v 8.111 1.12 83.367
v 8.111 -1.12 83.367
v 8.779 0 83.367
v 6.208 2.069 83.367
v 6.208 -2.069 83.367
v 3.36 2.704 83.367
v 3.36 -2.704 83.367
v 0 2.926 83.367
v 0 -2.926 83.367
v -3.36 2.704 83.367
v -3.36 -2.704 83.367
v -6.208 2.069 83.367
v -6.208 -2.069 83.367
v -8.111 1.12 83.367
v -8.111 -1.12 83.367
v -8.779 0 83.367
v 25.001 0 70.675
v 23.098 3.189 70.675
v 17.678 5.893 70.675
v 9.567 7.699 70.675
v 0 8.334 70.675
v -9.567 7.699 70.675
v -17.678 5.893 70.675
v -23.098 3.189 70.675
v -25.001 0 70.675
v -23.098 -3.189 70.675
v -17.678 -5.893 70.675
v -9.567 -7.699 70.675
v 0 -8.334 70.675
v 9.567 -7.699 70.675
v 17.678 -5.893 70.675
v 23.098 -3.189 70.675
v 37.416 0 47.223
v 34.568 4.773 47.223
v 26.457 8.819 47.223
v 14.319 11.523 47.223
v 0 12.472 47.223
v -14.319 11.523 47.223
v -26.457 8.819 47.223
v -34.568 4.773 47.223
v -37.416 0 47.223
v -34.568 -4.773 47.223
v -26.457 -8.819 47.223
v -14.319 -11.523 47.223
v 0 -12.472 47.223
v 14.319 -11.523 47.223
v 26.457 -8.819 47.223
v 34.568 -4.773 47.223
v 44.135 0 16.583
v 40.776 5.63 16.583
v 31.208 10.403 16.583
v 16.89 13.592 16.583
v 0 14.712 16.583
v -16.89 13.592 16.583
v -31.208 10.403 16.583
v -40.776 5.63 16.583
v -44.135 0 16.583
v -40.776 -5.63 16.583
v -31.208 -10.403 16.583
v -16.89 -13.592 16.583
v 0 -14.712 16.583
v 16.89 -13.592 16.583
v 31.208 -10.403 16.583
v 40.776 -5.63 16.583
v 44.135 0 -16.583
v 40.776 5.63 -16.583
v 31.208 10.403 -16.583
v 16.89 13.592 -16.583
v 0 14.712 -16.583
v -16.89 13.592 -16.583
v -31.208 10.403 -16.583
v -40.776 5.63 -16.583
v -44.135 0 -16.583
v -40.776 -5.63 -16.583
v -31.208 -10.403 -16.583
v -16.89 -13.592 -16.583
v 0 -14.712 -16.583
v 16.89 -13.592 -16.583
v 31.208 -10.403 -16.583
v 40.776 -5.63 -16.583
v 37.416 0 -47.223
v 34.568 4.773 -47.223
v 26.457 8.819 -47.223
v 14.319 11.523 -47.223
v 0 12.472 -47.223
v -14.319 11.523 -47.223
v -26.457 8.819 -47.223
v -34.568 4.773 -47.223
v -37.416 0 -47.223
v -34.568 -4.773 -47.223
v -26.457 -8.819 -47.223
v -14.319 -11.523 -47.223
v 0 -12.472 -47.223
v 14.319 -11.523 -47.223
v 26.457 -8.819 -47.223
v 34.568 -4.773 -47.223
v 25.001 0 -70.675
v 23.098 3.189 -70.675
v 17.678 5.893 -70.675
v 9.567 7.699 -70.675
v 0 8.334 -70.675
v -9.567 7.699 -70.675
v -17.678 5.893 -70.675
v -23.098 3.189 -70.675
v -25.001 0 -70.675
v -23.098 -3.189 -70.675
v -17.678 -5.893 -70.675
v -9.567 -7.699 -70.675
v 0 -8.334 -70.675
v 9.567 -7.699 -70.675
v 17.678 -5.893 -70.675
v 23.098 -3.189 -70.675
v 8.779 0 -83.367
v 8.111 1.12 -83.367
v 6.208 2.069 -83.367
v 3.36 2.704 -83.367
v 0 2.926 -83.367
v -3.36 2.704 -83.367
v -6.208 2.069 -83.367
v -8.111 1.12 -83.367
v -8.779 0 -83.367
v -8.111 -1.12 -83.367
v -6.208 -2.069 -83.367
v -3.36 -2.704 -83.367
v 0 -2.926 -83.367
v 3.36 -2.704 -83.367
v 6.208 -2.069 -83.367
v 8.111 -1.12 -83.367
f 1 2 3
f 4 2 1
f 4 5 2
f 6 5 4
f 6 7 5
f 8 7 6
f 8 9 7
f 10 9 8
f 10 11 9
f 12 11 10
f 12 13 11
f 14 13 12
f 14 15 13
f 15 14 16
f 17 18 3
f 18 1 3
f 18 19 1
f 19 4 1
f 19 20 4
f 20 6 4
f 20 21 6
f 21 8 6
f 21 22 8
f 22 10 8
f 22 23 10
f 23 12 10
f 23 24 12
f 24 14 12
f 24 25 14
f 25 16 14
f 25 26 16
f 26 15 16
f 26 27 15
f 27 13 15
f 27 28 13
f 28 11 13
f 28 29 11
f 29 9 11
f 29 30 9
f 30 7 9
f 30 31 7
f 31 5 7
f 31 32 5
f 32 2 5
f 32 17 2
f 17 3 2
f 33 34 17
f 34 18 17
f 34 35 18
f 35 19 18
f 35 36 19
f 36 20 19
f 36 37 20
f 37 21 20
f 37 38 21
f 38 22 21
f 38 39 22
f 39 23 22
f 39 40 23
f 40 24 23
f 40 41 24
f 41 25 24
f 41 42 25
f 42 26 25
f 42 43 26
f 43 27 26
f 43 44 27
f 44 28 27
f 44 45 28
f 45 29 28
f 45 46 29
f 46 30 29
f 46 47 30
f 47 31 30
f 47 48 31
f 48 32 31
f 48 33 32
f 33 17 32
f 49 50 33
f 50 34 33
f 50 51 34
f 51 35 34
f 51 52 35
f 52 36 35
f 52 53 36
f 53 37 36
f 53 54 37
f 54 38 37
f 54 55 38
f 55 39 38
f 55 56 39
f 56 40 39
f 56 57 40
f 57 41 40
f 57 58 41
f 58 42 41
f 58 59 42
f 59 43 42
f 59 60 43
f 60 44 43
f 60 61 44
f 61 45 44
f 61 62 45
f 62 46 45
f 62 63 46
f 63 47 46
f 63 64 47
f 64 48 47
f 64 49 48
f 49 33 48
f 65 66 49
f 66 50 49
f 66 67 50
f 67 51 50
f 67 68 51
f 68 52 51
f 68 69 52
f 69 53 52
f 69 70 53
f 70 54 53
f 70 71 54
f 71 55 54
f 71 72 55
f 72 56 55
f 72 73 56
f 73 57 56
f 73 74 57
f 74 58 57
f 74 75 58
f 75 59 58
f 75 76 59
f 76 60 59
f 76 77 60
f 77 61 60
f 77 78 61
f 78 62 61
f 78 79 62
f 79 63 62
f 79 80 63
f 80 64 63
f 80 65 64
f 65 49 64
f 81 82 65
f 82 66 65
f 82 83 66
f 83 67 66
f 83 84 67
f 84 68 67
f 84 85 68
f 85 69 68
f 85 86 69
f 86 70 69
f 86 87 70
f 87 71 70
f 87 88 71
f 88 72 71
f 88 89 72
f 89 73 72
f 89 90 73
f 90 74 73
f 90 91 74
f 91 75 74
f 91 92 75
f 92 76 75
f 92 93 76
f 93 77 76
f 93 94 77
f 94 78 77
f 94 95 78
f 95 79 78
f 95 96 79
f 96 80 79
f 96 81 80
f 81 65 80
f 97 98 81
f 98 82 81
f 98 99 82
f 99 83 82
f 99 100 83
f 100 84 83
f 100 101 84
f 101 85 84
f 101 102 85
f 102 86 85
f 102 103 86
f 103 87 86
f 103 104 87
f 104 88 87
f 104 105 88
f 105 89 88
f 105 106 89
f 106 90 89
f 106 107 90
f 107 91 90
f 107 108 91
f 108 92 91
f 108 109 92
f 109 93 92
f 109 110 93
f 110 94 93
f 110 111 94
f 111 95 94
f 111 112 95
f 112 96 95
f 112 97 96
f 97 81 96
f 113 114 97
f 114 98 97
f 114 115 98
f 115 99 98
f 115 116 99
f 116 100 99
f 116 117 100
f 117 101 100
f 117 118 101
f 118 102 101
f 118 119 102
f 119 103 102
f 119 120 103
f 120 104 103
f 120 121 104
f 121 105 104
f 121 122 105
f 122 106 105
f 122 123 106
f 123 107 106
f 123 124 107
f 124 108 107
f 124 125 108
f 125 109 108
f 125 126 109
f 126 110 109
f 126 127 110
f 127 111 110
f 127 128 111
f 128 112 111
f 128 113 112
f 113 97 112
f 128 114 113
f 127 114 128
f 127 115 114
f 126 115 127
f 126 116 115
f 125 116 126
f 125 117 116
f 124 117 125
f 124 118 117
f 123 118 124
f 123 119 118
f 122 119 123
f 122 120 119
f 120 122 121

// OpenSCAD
// Generated by SolidPython 1.0.1 on 2020-07-29 00:46:48


scale(v = [9, 3, 17]) {
	sphere(r = 5);
}
/***********************************************
*********      SolidPython code:      **********
************************************************
 
# import packages: SolidPython
from solid import *
from solid.utils import *
from itertools import chain, combinations, permutations


class Resize:

    def __init__(self, scad_file):
        self.scad_file = scad_file
        #self.scad_file = import_scad(scad_file)
        # cone/cylinder param:
        self.r1 = 0
        self.r2 = 0
        self.h = 0
        # rectangular prism param:
        self.w = 0
        self.l = 0
        # ellipse param:
        self.r = 0

    # import OpenScad code (file name corresponds to shape)


    # classify shape + parameters
    def assign(self, param1, param2, param3):
        if self.scad_file == 'cone.scad':
            self.r1 = param1
            self.r2 = param2
            self.h = param3
        elif self.scad_file == 'cylinder.scad':
            self.r1 = param1
            self.r2 = param2
            self.h = param3
        elif self.scad_file == 'rectangularPrism.scad':
            self.h = param1
            self.l = param2
            self.w = param3
        else:
            self.r = param1
            self.h = param2

    # resize parameters
    def iterate(self):
        x = range(3, 20, 2)
        i = 1
        if self.scad_file == 'cone.scad':
            tempList = list(permutations(x, 2))
            for temp in tempList:
                param1 = temp[0]
                param2 = temp[1]
                filepath = 'produced_scad_files/' + 'cone' + str(param1) + '_' + str(param2) + '_' + '.scad'
                scad_render_to_file(cylinder(h=param1, r1=param2, r2=0), filepath)

        elif self.scad_file == 'cylinder.scad':
            tempList = list(permutations(x, 3))
            for temp in tempList:
                param1 = temp[0]
                param2 = temp[1]
                filepath = 'produced_scad_files/' + 'cylinder' + str(param1) + '_' + str(param2) + '_' + '.scad'
                scad_render_to_file(cylinder(h=param1, r1=param2, r2=param2), filepath)

        elif self.scad_file == 'rectangularPrism.scad':
            tempList = list(permutations(x, 3))
            for temp in tempList:
                param1 = temp[0]
                param2 = temp[1]
                param3 = temp[2]
                filepath = 'produced_scad_files/' + 'rectangularPrism' + str(param1) + '_' + str(param2) + '_' + str(
                    param3) + '.scad'
                scad_render_to_file(cube(size=(param1, param2, param3)), filepath)

        elif self.scad_file == 'ellipse.scad':
            tempList = list(permutations(x, 4))
            for temp in tempList:
                param1 = temp[0]
                param2 = temp[1]
                param3 = temp[2]
                param4 = temp[3]
                filepath = 'produced_scad_files/' + 'ellipse' + str(param1) + '_' + str(param2) + '_' + str(param3) + '_' + str(param4) + '.scad'
                scad_render_to_file(scale([param1, param2, param3])(sphere(r=param4)), filepath)

    def render_to_scadfile(self):
        scad_render_to_file(scad, 'example.scad') 
 
************************************************/
